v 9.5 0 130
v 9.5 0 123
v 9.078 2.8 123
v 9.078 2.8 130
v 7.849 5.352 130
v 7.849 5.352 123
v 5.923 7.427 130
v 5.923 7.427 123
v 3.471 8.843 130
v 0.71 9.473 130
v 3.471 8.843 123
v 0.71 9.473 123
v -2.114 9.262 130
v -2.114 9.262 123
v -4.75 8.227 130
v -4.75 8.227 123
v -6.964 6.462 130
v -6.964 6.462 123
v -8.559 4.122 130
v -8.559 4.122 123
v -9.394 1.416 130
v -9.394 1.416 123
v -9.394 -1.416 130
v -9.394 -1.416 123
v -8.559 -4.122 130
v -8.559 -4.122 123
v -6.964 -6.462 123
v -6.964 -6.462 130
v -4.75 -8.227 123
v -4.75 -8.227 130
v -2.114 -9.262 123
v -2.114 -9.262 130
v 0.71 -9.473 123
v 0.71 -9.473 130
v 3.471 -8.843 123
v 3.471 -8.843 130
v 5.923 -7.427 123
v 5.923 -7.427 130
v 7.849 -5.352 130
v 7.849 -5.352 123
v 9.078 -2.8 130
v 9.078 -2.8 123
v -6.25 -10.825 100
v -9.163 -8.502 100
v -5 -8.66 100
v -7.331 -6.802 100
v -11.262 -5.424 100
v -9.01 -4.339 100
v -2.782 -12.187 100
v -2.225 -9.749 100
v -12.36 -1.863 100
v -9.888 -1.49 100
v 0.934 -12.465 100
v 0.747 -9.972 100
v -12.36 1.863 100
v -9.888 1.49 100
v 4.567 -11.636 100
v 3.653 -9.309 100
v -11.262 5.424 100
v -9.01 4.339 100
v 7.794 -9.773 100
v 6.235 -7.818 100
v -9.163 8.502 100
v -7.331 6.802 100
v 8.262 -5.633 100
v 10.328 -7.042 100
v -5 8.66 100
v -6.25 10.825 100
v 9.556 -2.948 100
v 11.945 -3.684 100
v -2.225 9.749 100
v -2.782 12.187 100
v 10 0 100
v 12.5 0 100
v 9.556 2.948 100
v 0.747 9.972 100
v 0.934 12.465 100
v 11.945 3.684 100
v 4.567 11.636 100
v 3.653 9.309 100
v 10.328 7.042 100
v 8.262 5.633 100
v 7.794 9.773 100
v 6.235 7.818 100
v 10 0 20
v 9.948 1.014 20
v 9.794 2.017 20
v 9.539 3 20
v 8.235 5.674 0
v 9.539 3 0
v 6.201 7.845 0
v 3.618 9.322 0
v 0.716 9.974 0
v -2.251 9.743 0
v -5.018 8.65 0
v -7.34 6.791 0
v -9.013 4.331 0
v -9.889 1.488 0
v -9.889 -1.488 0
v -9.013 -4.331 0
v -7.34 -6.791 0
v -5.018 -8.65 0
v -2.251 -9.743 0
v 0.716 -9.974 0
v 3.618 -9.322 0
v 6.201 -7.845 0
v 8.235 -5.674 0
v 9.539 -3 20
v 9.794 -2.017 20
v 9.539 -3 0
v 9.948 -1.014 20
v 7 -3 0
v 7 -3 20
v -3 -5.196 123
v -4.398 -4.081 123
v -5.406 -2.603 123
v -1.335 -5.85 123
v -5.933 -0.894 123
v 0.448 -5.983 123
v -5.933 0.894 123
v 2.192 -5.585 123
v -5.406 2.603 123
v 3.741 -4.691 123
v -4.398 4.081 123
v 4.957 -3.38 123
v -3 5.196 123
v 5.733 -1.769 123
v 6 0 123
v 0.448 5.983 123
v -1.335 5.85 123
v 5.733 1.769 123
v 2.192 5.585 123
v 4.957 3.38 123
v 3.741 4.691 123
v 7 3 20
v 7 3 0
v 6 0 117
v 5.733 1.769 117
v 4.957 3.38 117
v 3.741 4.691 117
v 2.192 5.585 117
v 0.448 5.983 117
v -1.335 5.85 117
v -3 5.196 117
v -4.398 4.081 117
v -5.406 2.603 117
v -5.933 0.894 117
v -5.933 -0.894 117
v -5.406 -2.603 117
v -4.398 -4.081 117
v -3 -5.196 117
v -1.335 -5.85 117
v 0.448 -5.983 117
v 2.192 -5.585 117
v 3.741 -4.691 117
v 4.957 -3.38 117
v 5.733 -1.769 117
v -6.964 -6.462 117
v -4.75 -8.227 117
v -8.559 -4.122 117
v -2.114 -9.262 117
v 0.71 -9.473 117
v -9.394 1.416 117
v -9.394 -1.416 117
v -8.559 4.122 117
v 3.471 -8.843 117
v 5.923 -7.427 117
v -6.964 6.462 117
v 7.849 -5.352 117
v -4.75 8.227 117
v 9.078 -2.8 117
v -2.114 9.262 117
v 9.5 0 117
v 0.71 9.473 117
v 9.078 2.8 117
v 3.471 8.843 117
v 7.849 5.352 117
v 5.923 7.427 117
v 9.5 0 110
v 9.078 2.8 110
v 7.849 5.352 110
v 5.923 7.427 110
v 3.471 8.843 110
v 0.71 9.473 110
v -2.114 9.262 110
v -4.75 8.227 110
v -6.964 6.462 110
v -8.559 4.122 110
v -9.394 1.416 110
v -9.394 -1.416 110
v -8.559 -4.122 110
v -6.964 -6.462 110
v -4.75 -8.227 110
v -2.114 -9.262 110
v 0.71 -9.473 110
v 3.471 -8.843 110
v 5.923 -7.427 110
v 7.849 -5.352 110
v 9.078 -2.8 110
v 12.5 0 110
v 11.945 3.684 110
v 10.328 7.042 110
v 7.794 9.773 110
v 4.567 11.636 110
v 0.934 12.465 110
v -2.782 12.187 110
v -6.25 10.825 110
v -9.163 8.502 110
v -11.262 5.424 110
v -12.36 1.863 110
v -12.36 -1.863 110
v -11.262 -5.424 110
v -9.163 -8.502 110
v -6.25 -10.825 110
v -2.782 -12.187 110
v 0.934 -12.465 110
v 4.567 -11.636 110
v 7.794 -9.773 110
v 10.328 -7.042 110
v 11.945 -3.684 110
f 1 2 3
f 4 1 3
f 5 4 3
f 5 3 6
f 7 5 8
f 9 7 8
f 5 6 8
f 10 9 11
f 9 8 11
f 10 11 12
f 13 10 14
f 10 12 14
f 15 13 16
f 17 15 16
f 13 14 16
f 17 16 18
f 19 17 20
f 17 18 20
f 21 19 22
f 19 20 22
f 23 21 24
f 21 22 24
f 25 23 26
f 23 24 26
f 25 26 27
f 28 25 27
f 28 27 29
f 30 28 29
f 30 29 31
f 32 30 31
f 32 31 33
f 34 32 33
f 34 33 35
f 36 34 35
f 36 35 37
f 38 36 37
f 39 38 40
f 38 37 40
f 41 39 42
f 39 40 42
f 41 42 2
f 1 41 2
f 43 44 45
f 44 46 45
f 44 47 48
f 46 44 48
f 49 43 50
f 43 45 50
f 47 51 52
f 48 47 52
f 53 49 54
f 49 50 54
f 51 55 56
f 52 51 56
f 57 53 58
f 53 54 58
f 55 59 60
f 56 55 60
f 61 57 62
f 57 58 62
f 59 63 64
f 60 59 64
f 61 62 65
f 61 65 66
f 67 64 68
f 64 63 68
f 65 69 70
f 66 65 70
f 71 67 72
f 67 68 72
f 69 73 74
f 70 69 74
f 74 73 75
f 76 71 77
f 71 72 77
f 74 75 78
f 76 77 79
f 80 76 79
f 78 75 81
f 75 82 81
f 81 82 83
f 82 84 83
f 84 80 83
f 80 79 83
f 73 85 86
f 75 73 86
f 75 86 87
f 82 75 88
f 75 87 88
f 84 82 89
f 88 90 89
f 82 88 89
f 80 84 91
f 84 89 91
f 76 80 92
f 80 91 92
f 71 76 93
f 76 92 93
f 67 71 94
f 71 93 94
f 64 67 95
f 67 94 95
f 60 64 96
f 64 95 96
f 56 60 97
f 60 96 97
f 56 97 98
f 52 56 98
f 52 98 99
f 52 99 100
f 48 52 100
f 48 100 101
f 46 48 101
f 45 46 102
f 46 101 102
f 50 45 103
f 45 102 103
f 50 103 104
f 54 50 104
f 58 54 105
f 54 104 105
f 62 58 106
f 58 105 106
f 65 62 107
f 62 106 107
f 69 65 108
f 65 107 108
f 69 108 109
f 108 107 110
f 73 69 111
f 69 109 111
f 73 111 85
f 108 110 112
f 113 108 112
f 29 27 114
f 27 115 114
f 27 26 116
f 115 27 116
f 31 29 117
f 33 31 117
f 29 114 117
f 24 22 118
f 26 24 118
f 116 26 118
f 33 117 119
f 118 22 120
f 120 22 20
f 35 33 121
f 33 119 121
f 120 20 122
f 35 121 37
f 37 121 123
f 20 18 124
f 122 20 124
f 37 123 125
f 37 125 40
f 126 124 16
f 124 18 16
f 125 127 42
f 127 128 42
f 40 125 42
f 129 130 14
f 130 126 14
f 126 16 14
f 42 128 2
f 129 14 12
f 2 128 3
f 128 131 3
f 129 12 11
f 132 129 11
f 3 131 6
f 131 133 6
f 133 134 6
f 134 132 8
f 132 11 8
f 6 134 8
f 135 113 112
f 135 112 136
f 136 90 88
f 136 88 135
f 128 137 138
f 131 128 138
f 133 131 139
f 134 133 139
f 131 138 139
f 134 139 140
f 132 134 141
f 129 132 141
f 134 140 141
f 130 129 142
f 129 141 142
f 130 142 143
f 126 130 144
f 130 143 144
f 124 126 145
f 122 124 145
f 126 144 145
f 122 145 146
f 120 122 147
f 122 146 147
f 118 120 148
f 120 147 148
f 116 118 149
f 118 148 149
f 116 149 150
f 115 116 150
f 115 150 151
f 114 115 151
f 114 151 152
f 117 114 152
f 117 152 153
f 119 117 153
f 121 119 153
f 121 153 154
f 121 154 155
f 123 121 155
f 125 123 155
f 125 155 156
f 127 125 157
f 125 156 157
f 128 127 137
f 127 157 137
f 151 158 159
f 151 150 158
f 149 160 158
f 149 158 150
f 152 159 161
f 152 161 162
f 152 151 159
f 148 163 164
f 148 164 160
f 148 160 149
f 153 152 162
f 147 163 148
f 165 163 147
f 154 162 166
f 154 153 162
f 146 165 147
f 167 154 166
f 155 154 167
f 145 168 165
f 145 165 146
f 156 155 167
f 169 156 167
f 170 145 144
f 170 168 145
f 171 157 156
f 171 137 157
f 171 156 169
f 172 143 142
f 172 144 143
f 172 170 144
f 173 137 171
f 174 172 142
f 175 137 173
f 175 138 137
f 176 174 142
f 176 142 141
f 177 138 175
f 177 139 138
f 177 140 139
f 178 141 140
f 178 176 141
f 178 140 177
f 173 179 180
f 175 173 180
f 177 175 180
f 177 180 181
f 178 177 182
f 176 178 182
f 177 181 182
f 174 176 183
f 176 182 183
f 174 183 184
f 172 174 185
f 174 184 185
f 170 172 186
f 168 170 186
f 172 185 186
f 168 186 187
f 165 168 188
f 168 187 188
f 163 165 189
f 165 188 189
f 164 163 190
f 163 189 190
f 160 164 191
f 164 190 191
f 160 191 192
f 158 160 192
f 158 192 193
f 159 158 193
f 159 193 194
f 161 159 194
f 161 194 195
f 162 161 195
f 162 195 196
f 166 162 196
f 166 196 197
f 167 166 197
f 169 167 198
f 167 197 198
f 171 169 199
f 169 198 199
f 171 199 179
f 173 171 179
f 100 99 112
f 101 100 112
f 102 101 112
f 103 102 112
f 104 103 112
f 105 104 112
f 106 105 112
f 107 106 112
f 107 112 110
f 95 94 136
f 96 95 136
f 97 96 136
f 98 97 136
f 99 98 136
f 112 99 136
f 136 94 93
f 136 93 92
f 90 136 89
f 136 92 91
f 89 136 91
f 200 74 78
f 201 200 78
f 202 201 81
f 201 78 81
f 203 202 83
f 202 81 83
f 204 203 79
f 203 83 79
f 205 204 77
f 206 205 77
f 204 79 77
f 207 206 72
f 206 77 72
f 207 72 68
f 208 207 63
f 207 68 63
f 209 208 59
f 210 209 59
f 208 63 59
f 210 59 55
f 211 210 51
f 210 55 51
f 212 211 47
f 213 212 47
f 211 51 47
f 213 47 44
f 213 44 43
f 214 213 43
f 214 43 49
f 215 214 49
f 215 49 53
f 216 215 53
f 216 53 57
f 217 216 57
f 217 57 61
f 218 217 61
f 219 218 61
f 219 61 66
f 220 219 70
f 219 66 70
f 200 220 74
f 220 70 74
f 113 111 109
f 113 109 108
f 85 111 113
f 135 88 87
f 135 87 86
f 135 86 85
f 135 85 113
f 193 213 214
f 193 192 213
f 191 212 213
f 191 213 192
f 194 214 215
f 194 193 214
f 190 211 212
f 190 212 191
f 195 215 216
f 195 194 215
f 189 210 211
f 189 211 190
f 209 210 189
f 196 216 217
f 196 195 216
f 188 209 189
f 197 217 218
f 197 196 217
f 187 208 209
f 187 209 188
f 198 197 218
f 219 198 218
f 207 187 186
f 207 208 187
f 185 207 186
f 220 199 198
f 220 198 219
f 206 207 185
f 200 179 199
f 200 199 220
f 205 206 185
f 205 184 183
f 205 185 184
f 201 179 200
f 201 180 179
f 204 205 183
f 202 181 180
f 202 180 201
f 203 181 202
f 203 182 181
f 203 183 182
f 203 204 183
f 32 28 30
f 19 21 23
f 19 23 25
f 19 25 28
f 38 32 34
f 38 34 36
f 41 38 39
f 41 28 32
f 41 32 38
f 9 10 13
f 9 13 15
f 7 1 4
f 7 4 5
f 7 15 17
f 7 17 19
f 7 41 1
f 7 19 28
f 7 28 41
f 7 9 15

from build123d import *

# Parameters (mm, degrees)
SKETCH1_R           = 10
BOSS_EXTRUDE1_DEPTH = 100
SKETCH2_R           = 12.5
BOSS_EXTRUDE2_DEPTH = 10
SKETCH3_R           = 9.5
BOSS_EXTRUDE3_DEPTH = 7
SKETCH4_R           = 6
BOSS_EXTRUDE4_DEPTH = 6
SKETCH5_R           = 9.5
BOSS_EXTRUDE5_DEPTH = 7
SKETCH6_W           = 5
SKETCH6_H           = 6
CUT_EXTRUDE1_DEPTH  = 20


with BuildPart() as part:
    # Sketch1 → Boss-Extrude1 (new body)
    with BuildSketch(Plane.XY):
        Circle(SKETCH1_R)
    extrude(amount=BOSS_EXTRUDE1_DEPTH)

    # Sketch2 → Boss-Extrude2 (add)
    with BuildSketch(Plane.XY.offset(100)):
        Circle(SKETCH2_R)
    extrude(amount=BOSS_EXTRUDE2_DEPTH)

    # Sketch3 → Boss-Extrude3 (add)
    with BuildSketch(Plane.XY.offset(110)):
        Circle(SKETCH3_R)
    extrude(amount=BOSS_EXTRUDE3_DEPTH)

    # Sketch4 → Boss-Extrude4 (add)
    with BuildSketch(Plane.XY.offset(117)):
        Circle(SKETCH4_R)
    extrude(amount=BOSS_EXTRUDE4_DEPTH)

    # Sketch5 → Boss-Extrude5 (add)
    with BuildSketch(Plane.XY.offset(123)):
        Circle(SKETCH5_R)
    extrude(amount=BOSS_EXTRUDE5_DEPTH)

    # Sketch6 → Cut-Extrude1 (cut)
    with BuildSketch(Plane(origin=(0, 0, 0), x_dir=(-1, 0, 0), z_dir=(0, 0, -1))):
        with Locations((-9.5, 0)):
            Rectangle(SKETCH6_W, SKETCH6_H)
    extrude(amount=-CUT_EXTRUDE1_DEPTH, mode=Mode.SUBTRACT)


solid = part.part
